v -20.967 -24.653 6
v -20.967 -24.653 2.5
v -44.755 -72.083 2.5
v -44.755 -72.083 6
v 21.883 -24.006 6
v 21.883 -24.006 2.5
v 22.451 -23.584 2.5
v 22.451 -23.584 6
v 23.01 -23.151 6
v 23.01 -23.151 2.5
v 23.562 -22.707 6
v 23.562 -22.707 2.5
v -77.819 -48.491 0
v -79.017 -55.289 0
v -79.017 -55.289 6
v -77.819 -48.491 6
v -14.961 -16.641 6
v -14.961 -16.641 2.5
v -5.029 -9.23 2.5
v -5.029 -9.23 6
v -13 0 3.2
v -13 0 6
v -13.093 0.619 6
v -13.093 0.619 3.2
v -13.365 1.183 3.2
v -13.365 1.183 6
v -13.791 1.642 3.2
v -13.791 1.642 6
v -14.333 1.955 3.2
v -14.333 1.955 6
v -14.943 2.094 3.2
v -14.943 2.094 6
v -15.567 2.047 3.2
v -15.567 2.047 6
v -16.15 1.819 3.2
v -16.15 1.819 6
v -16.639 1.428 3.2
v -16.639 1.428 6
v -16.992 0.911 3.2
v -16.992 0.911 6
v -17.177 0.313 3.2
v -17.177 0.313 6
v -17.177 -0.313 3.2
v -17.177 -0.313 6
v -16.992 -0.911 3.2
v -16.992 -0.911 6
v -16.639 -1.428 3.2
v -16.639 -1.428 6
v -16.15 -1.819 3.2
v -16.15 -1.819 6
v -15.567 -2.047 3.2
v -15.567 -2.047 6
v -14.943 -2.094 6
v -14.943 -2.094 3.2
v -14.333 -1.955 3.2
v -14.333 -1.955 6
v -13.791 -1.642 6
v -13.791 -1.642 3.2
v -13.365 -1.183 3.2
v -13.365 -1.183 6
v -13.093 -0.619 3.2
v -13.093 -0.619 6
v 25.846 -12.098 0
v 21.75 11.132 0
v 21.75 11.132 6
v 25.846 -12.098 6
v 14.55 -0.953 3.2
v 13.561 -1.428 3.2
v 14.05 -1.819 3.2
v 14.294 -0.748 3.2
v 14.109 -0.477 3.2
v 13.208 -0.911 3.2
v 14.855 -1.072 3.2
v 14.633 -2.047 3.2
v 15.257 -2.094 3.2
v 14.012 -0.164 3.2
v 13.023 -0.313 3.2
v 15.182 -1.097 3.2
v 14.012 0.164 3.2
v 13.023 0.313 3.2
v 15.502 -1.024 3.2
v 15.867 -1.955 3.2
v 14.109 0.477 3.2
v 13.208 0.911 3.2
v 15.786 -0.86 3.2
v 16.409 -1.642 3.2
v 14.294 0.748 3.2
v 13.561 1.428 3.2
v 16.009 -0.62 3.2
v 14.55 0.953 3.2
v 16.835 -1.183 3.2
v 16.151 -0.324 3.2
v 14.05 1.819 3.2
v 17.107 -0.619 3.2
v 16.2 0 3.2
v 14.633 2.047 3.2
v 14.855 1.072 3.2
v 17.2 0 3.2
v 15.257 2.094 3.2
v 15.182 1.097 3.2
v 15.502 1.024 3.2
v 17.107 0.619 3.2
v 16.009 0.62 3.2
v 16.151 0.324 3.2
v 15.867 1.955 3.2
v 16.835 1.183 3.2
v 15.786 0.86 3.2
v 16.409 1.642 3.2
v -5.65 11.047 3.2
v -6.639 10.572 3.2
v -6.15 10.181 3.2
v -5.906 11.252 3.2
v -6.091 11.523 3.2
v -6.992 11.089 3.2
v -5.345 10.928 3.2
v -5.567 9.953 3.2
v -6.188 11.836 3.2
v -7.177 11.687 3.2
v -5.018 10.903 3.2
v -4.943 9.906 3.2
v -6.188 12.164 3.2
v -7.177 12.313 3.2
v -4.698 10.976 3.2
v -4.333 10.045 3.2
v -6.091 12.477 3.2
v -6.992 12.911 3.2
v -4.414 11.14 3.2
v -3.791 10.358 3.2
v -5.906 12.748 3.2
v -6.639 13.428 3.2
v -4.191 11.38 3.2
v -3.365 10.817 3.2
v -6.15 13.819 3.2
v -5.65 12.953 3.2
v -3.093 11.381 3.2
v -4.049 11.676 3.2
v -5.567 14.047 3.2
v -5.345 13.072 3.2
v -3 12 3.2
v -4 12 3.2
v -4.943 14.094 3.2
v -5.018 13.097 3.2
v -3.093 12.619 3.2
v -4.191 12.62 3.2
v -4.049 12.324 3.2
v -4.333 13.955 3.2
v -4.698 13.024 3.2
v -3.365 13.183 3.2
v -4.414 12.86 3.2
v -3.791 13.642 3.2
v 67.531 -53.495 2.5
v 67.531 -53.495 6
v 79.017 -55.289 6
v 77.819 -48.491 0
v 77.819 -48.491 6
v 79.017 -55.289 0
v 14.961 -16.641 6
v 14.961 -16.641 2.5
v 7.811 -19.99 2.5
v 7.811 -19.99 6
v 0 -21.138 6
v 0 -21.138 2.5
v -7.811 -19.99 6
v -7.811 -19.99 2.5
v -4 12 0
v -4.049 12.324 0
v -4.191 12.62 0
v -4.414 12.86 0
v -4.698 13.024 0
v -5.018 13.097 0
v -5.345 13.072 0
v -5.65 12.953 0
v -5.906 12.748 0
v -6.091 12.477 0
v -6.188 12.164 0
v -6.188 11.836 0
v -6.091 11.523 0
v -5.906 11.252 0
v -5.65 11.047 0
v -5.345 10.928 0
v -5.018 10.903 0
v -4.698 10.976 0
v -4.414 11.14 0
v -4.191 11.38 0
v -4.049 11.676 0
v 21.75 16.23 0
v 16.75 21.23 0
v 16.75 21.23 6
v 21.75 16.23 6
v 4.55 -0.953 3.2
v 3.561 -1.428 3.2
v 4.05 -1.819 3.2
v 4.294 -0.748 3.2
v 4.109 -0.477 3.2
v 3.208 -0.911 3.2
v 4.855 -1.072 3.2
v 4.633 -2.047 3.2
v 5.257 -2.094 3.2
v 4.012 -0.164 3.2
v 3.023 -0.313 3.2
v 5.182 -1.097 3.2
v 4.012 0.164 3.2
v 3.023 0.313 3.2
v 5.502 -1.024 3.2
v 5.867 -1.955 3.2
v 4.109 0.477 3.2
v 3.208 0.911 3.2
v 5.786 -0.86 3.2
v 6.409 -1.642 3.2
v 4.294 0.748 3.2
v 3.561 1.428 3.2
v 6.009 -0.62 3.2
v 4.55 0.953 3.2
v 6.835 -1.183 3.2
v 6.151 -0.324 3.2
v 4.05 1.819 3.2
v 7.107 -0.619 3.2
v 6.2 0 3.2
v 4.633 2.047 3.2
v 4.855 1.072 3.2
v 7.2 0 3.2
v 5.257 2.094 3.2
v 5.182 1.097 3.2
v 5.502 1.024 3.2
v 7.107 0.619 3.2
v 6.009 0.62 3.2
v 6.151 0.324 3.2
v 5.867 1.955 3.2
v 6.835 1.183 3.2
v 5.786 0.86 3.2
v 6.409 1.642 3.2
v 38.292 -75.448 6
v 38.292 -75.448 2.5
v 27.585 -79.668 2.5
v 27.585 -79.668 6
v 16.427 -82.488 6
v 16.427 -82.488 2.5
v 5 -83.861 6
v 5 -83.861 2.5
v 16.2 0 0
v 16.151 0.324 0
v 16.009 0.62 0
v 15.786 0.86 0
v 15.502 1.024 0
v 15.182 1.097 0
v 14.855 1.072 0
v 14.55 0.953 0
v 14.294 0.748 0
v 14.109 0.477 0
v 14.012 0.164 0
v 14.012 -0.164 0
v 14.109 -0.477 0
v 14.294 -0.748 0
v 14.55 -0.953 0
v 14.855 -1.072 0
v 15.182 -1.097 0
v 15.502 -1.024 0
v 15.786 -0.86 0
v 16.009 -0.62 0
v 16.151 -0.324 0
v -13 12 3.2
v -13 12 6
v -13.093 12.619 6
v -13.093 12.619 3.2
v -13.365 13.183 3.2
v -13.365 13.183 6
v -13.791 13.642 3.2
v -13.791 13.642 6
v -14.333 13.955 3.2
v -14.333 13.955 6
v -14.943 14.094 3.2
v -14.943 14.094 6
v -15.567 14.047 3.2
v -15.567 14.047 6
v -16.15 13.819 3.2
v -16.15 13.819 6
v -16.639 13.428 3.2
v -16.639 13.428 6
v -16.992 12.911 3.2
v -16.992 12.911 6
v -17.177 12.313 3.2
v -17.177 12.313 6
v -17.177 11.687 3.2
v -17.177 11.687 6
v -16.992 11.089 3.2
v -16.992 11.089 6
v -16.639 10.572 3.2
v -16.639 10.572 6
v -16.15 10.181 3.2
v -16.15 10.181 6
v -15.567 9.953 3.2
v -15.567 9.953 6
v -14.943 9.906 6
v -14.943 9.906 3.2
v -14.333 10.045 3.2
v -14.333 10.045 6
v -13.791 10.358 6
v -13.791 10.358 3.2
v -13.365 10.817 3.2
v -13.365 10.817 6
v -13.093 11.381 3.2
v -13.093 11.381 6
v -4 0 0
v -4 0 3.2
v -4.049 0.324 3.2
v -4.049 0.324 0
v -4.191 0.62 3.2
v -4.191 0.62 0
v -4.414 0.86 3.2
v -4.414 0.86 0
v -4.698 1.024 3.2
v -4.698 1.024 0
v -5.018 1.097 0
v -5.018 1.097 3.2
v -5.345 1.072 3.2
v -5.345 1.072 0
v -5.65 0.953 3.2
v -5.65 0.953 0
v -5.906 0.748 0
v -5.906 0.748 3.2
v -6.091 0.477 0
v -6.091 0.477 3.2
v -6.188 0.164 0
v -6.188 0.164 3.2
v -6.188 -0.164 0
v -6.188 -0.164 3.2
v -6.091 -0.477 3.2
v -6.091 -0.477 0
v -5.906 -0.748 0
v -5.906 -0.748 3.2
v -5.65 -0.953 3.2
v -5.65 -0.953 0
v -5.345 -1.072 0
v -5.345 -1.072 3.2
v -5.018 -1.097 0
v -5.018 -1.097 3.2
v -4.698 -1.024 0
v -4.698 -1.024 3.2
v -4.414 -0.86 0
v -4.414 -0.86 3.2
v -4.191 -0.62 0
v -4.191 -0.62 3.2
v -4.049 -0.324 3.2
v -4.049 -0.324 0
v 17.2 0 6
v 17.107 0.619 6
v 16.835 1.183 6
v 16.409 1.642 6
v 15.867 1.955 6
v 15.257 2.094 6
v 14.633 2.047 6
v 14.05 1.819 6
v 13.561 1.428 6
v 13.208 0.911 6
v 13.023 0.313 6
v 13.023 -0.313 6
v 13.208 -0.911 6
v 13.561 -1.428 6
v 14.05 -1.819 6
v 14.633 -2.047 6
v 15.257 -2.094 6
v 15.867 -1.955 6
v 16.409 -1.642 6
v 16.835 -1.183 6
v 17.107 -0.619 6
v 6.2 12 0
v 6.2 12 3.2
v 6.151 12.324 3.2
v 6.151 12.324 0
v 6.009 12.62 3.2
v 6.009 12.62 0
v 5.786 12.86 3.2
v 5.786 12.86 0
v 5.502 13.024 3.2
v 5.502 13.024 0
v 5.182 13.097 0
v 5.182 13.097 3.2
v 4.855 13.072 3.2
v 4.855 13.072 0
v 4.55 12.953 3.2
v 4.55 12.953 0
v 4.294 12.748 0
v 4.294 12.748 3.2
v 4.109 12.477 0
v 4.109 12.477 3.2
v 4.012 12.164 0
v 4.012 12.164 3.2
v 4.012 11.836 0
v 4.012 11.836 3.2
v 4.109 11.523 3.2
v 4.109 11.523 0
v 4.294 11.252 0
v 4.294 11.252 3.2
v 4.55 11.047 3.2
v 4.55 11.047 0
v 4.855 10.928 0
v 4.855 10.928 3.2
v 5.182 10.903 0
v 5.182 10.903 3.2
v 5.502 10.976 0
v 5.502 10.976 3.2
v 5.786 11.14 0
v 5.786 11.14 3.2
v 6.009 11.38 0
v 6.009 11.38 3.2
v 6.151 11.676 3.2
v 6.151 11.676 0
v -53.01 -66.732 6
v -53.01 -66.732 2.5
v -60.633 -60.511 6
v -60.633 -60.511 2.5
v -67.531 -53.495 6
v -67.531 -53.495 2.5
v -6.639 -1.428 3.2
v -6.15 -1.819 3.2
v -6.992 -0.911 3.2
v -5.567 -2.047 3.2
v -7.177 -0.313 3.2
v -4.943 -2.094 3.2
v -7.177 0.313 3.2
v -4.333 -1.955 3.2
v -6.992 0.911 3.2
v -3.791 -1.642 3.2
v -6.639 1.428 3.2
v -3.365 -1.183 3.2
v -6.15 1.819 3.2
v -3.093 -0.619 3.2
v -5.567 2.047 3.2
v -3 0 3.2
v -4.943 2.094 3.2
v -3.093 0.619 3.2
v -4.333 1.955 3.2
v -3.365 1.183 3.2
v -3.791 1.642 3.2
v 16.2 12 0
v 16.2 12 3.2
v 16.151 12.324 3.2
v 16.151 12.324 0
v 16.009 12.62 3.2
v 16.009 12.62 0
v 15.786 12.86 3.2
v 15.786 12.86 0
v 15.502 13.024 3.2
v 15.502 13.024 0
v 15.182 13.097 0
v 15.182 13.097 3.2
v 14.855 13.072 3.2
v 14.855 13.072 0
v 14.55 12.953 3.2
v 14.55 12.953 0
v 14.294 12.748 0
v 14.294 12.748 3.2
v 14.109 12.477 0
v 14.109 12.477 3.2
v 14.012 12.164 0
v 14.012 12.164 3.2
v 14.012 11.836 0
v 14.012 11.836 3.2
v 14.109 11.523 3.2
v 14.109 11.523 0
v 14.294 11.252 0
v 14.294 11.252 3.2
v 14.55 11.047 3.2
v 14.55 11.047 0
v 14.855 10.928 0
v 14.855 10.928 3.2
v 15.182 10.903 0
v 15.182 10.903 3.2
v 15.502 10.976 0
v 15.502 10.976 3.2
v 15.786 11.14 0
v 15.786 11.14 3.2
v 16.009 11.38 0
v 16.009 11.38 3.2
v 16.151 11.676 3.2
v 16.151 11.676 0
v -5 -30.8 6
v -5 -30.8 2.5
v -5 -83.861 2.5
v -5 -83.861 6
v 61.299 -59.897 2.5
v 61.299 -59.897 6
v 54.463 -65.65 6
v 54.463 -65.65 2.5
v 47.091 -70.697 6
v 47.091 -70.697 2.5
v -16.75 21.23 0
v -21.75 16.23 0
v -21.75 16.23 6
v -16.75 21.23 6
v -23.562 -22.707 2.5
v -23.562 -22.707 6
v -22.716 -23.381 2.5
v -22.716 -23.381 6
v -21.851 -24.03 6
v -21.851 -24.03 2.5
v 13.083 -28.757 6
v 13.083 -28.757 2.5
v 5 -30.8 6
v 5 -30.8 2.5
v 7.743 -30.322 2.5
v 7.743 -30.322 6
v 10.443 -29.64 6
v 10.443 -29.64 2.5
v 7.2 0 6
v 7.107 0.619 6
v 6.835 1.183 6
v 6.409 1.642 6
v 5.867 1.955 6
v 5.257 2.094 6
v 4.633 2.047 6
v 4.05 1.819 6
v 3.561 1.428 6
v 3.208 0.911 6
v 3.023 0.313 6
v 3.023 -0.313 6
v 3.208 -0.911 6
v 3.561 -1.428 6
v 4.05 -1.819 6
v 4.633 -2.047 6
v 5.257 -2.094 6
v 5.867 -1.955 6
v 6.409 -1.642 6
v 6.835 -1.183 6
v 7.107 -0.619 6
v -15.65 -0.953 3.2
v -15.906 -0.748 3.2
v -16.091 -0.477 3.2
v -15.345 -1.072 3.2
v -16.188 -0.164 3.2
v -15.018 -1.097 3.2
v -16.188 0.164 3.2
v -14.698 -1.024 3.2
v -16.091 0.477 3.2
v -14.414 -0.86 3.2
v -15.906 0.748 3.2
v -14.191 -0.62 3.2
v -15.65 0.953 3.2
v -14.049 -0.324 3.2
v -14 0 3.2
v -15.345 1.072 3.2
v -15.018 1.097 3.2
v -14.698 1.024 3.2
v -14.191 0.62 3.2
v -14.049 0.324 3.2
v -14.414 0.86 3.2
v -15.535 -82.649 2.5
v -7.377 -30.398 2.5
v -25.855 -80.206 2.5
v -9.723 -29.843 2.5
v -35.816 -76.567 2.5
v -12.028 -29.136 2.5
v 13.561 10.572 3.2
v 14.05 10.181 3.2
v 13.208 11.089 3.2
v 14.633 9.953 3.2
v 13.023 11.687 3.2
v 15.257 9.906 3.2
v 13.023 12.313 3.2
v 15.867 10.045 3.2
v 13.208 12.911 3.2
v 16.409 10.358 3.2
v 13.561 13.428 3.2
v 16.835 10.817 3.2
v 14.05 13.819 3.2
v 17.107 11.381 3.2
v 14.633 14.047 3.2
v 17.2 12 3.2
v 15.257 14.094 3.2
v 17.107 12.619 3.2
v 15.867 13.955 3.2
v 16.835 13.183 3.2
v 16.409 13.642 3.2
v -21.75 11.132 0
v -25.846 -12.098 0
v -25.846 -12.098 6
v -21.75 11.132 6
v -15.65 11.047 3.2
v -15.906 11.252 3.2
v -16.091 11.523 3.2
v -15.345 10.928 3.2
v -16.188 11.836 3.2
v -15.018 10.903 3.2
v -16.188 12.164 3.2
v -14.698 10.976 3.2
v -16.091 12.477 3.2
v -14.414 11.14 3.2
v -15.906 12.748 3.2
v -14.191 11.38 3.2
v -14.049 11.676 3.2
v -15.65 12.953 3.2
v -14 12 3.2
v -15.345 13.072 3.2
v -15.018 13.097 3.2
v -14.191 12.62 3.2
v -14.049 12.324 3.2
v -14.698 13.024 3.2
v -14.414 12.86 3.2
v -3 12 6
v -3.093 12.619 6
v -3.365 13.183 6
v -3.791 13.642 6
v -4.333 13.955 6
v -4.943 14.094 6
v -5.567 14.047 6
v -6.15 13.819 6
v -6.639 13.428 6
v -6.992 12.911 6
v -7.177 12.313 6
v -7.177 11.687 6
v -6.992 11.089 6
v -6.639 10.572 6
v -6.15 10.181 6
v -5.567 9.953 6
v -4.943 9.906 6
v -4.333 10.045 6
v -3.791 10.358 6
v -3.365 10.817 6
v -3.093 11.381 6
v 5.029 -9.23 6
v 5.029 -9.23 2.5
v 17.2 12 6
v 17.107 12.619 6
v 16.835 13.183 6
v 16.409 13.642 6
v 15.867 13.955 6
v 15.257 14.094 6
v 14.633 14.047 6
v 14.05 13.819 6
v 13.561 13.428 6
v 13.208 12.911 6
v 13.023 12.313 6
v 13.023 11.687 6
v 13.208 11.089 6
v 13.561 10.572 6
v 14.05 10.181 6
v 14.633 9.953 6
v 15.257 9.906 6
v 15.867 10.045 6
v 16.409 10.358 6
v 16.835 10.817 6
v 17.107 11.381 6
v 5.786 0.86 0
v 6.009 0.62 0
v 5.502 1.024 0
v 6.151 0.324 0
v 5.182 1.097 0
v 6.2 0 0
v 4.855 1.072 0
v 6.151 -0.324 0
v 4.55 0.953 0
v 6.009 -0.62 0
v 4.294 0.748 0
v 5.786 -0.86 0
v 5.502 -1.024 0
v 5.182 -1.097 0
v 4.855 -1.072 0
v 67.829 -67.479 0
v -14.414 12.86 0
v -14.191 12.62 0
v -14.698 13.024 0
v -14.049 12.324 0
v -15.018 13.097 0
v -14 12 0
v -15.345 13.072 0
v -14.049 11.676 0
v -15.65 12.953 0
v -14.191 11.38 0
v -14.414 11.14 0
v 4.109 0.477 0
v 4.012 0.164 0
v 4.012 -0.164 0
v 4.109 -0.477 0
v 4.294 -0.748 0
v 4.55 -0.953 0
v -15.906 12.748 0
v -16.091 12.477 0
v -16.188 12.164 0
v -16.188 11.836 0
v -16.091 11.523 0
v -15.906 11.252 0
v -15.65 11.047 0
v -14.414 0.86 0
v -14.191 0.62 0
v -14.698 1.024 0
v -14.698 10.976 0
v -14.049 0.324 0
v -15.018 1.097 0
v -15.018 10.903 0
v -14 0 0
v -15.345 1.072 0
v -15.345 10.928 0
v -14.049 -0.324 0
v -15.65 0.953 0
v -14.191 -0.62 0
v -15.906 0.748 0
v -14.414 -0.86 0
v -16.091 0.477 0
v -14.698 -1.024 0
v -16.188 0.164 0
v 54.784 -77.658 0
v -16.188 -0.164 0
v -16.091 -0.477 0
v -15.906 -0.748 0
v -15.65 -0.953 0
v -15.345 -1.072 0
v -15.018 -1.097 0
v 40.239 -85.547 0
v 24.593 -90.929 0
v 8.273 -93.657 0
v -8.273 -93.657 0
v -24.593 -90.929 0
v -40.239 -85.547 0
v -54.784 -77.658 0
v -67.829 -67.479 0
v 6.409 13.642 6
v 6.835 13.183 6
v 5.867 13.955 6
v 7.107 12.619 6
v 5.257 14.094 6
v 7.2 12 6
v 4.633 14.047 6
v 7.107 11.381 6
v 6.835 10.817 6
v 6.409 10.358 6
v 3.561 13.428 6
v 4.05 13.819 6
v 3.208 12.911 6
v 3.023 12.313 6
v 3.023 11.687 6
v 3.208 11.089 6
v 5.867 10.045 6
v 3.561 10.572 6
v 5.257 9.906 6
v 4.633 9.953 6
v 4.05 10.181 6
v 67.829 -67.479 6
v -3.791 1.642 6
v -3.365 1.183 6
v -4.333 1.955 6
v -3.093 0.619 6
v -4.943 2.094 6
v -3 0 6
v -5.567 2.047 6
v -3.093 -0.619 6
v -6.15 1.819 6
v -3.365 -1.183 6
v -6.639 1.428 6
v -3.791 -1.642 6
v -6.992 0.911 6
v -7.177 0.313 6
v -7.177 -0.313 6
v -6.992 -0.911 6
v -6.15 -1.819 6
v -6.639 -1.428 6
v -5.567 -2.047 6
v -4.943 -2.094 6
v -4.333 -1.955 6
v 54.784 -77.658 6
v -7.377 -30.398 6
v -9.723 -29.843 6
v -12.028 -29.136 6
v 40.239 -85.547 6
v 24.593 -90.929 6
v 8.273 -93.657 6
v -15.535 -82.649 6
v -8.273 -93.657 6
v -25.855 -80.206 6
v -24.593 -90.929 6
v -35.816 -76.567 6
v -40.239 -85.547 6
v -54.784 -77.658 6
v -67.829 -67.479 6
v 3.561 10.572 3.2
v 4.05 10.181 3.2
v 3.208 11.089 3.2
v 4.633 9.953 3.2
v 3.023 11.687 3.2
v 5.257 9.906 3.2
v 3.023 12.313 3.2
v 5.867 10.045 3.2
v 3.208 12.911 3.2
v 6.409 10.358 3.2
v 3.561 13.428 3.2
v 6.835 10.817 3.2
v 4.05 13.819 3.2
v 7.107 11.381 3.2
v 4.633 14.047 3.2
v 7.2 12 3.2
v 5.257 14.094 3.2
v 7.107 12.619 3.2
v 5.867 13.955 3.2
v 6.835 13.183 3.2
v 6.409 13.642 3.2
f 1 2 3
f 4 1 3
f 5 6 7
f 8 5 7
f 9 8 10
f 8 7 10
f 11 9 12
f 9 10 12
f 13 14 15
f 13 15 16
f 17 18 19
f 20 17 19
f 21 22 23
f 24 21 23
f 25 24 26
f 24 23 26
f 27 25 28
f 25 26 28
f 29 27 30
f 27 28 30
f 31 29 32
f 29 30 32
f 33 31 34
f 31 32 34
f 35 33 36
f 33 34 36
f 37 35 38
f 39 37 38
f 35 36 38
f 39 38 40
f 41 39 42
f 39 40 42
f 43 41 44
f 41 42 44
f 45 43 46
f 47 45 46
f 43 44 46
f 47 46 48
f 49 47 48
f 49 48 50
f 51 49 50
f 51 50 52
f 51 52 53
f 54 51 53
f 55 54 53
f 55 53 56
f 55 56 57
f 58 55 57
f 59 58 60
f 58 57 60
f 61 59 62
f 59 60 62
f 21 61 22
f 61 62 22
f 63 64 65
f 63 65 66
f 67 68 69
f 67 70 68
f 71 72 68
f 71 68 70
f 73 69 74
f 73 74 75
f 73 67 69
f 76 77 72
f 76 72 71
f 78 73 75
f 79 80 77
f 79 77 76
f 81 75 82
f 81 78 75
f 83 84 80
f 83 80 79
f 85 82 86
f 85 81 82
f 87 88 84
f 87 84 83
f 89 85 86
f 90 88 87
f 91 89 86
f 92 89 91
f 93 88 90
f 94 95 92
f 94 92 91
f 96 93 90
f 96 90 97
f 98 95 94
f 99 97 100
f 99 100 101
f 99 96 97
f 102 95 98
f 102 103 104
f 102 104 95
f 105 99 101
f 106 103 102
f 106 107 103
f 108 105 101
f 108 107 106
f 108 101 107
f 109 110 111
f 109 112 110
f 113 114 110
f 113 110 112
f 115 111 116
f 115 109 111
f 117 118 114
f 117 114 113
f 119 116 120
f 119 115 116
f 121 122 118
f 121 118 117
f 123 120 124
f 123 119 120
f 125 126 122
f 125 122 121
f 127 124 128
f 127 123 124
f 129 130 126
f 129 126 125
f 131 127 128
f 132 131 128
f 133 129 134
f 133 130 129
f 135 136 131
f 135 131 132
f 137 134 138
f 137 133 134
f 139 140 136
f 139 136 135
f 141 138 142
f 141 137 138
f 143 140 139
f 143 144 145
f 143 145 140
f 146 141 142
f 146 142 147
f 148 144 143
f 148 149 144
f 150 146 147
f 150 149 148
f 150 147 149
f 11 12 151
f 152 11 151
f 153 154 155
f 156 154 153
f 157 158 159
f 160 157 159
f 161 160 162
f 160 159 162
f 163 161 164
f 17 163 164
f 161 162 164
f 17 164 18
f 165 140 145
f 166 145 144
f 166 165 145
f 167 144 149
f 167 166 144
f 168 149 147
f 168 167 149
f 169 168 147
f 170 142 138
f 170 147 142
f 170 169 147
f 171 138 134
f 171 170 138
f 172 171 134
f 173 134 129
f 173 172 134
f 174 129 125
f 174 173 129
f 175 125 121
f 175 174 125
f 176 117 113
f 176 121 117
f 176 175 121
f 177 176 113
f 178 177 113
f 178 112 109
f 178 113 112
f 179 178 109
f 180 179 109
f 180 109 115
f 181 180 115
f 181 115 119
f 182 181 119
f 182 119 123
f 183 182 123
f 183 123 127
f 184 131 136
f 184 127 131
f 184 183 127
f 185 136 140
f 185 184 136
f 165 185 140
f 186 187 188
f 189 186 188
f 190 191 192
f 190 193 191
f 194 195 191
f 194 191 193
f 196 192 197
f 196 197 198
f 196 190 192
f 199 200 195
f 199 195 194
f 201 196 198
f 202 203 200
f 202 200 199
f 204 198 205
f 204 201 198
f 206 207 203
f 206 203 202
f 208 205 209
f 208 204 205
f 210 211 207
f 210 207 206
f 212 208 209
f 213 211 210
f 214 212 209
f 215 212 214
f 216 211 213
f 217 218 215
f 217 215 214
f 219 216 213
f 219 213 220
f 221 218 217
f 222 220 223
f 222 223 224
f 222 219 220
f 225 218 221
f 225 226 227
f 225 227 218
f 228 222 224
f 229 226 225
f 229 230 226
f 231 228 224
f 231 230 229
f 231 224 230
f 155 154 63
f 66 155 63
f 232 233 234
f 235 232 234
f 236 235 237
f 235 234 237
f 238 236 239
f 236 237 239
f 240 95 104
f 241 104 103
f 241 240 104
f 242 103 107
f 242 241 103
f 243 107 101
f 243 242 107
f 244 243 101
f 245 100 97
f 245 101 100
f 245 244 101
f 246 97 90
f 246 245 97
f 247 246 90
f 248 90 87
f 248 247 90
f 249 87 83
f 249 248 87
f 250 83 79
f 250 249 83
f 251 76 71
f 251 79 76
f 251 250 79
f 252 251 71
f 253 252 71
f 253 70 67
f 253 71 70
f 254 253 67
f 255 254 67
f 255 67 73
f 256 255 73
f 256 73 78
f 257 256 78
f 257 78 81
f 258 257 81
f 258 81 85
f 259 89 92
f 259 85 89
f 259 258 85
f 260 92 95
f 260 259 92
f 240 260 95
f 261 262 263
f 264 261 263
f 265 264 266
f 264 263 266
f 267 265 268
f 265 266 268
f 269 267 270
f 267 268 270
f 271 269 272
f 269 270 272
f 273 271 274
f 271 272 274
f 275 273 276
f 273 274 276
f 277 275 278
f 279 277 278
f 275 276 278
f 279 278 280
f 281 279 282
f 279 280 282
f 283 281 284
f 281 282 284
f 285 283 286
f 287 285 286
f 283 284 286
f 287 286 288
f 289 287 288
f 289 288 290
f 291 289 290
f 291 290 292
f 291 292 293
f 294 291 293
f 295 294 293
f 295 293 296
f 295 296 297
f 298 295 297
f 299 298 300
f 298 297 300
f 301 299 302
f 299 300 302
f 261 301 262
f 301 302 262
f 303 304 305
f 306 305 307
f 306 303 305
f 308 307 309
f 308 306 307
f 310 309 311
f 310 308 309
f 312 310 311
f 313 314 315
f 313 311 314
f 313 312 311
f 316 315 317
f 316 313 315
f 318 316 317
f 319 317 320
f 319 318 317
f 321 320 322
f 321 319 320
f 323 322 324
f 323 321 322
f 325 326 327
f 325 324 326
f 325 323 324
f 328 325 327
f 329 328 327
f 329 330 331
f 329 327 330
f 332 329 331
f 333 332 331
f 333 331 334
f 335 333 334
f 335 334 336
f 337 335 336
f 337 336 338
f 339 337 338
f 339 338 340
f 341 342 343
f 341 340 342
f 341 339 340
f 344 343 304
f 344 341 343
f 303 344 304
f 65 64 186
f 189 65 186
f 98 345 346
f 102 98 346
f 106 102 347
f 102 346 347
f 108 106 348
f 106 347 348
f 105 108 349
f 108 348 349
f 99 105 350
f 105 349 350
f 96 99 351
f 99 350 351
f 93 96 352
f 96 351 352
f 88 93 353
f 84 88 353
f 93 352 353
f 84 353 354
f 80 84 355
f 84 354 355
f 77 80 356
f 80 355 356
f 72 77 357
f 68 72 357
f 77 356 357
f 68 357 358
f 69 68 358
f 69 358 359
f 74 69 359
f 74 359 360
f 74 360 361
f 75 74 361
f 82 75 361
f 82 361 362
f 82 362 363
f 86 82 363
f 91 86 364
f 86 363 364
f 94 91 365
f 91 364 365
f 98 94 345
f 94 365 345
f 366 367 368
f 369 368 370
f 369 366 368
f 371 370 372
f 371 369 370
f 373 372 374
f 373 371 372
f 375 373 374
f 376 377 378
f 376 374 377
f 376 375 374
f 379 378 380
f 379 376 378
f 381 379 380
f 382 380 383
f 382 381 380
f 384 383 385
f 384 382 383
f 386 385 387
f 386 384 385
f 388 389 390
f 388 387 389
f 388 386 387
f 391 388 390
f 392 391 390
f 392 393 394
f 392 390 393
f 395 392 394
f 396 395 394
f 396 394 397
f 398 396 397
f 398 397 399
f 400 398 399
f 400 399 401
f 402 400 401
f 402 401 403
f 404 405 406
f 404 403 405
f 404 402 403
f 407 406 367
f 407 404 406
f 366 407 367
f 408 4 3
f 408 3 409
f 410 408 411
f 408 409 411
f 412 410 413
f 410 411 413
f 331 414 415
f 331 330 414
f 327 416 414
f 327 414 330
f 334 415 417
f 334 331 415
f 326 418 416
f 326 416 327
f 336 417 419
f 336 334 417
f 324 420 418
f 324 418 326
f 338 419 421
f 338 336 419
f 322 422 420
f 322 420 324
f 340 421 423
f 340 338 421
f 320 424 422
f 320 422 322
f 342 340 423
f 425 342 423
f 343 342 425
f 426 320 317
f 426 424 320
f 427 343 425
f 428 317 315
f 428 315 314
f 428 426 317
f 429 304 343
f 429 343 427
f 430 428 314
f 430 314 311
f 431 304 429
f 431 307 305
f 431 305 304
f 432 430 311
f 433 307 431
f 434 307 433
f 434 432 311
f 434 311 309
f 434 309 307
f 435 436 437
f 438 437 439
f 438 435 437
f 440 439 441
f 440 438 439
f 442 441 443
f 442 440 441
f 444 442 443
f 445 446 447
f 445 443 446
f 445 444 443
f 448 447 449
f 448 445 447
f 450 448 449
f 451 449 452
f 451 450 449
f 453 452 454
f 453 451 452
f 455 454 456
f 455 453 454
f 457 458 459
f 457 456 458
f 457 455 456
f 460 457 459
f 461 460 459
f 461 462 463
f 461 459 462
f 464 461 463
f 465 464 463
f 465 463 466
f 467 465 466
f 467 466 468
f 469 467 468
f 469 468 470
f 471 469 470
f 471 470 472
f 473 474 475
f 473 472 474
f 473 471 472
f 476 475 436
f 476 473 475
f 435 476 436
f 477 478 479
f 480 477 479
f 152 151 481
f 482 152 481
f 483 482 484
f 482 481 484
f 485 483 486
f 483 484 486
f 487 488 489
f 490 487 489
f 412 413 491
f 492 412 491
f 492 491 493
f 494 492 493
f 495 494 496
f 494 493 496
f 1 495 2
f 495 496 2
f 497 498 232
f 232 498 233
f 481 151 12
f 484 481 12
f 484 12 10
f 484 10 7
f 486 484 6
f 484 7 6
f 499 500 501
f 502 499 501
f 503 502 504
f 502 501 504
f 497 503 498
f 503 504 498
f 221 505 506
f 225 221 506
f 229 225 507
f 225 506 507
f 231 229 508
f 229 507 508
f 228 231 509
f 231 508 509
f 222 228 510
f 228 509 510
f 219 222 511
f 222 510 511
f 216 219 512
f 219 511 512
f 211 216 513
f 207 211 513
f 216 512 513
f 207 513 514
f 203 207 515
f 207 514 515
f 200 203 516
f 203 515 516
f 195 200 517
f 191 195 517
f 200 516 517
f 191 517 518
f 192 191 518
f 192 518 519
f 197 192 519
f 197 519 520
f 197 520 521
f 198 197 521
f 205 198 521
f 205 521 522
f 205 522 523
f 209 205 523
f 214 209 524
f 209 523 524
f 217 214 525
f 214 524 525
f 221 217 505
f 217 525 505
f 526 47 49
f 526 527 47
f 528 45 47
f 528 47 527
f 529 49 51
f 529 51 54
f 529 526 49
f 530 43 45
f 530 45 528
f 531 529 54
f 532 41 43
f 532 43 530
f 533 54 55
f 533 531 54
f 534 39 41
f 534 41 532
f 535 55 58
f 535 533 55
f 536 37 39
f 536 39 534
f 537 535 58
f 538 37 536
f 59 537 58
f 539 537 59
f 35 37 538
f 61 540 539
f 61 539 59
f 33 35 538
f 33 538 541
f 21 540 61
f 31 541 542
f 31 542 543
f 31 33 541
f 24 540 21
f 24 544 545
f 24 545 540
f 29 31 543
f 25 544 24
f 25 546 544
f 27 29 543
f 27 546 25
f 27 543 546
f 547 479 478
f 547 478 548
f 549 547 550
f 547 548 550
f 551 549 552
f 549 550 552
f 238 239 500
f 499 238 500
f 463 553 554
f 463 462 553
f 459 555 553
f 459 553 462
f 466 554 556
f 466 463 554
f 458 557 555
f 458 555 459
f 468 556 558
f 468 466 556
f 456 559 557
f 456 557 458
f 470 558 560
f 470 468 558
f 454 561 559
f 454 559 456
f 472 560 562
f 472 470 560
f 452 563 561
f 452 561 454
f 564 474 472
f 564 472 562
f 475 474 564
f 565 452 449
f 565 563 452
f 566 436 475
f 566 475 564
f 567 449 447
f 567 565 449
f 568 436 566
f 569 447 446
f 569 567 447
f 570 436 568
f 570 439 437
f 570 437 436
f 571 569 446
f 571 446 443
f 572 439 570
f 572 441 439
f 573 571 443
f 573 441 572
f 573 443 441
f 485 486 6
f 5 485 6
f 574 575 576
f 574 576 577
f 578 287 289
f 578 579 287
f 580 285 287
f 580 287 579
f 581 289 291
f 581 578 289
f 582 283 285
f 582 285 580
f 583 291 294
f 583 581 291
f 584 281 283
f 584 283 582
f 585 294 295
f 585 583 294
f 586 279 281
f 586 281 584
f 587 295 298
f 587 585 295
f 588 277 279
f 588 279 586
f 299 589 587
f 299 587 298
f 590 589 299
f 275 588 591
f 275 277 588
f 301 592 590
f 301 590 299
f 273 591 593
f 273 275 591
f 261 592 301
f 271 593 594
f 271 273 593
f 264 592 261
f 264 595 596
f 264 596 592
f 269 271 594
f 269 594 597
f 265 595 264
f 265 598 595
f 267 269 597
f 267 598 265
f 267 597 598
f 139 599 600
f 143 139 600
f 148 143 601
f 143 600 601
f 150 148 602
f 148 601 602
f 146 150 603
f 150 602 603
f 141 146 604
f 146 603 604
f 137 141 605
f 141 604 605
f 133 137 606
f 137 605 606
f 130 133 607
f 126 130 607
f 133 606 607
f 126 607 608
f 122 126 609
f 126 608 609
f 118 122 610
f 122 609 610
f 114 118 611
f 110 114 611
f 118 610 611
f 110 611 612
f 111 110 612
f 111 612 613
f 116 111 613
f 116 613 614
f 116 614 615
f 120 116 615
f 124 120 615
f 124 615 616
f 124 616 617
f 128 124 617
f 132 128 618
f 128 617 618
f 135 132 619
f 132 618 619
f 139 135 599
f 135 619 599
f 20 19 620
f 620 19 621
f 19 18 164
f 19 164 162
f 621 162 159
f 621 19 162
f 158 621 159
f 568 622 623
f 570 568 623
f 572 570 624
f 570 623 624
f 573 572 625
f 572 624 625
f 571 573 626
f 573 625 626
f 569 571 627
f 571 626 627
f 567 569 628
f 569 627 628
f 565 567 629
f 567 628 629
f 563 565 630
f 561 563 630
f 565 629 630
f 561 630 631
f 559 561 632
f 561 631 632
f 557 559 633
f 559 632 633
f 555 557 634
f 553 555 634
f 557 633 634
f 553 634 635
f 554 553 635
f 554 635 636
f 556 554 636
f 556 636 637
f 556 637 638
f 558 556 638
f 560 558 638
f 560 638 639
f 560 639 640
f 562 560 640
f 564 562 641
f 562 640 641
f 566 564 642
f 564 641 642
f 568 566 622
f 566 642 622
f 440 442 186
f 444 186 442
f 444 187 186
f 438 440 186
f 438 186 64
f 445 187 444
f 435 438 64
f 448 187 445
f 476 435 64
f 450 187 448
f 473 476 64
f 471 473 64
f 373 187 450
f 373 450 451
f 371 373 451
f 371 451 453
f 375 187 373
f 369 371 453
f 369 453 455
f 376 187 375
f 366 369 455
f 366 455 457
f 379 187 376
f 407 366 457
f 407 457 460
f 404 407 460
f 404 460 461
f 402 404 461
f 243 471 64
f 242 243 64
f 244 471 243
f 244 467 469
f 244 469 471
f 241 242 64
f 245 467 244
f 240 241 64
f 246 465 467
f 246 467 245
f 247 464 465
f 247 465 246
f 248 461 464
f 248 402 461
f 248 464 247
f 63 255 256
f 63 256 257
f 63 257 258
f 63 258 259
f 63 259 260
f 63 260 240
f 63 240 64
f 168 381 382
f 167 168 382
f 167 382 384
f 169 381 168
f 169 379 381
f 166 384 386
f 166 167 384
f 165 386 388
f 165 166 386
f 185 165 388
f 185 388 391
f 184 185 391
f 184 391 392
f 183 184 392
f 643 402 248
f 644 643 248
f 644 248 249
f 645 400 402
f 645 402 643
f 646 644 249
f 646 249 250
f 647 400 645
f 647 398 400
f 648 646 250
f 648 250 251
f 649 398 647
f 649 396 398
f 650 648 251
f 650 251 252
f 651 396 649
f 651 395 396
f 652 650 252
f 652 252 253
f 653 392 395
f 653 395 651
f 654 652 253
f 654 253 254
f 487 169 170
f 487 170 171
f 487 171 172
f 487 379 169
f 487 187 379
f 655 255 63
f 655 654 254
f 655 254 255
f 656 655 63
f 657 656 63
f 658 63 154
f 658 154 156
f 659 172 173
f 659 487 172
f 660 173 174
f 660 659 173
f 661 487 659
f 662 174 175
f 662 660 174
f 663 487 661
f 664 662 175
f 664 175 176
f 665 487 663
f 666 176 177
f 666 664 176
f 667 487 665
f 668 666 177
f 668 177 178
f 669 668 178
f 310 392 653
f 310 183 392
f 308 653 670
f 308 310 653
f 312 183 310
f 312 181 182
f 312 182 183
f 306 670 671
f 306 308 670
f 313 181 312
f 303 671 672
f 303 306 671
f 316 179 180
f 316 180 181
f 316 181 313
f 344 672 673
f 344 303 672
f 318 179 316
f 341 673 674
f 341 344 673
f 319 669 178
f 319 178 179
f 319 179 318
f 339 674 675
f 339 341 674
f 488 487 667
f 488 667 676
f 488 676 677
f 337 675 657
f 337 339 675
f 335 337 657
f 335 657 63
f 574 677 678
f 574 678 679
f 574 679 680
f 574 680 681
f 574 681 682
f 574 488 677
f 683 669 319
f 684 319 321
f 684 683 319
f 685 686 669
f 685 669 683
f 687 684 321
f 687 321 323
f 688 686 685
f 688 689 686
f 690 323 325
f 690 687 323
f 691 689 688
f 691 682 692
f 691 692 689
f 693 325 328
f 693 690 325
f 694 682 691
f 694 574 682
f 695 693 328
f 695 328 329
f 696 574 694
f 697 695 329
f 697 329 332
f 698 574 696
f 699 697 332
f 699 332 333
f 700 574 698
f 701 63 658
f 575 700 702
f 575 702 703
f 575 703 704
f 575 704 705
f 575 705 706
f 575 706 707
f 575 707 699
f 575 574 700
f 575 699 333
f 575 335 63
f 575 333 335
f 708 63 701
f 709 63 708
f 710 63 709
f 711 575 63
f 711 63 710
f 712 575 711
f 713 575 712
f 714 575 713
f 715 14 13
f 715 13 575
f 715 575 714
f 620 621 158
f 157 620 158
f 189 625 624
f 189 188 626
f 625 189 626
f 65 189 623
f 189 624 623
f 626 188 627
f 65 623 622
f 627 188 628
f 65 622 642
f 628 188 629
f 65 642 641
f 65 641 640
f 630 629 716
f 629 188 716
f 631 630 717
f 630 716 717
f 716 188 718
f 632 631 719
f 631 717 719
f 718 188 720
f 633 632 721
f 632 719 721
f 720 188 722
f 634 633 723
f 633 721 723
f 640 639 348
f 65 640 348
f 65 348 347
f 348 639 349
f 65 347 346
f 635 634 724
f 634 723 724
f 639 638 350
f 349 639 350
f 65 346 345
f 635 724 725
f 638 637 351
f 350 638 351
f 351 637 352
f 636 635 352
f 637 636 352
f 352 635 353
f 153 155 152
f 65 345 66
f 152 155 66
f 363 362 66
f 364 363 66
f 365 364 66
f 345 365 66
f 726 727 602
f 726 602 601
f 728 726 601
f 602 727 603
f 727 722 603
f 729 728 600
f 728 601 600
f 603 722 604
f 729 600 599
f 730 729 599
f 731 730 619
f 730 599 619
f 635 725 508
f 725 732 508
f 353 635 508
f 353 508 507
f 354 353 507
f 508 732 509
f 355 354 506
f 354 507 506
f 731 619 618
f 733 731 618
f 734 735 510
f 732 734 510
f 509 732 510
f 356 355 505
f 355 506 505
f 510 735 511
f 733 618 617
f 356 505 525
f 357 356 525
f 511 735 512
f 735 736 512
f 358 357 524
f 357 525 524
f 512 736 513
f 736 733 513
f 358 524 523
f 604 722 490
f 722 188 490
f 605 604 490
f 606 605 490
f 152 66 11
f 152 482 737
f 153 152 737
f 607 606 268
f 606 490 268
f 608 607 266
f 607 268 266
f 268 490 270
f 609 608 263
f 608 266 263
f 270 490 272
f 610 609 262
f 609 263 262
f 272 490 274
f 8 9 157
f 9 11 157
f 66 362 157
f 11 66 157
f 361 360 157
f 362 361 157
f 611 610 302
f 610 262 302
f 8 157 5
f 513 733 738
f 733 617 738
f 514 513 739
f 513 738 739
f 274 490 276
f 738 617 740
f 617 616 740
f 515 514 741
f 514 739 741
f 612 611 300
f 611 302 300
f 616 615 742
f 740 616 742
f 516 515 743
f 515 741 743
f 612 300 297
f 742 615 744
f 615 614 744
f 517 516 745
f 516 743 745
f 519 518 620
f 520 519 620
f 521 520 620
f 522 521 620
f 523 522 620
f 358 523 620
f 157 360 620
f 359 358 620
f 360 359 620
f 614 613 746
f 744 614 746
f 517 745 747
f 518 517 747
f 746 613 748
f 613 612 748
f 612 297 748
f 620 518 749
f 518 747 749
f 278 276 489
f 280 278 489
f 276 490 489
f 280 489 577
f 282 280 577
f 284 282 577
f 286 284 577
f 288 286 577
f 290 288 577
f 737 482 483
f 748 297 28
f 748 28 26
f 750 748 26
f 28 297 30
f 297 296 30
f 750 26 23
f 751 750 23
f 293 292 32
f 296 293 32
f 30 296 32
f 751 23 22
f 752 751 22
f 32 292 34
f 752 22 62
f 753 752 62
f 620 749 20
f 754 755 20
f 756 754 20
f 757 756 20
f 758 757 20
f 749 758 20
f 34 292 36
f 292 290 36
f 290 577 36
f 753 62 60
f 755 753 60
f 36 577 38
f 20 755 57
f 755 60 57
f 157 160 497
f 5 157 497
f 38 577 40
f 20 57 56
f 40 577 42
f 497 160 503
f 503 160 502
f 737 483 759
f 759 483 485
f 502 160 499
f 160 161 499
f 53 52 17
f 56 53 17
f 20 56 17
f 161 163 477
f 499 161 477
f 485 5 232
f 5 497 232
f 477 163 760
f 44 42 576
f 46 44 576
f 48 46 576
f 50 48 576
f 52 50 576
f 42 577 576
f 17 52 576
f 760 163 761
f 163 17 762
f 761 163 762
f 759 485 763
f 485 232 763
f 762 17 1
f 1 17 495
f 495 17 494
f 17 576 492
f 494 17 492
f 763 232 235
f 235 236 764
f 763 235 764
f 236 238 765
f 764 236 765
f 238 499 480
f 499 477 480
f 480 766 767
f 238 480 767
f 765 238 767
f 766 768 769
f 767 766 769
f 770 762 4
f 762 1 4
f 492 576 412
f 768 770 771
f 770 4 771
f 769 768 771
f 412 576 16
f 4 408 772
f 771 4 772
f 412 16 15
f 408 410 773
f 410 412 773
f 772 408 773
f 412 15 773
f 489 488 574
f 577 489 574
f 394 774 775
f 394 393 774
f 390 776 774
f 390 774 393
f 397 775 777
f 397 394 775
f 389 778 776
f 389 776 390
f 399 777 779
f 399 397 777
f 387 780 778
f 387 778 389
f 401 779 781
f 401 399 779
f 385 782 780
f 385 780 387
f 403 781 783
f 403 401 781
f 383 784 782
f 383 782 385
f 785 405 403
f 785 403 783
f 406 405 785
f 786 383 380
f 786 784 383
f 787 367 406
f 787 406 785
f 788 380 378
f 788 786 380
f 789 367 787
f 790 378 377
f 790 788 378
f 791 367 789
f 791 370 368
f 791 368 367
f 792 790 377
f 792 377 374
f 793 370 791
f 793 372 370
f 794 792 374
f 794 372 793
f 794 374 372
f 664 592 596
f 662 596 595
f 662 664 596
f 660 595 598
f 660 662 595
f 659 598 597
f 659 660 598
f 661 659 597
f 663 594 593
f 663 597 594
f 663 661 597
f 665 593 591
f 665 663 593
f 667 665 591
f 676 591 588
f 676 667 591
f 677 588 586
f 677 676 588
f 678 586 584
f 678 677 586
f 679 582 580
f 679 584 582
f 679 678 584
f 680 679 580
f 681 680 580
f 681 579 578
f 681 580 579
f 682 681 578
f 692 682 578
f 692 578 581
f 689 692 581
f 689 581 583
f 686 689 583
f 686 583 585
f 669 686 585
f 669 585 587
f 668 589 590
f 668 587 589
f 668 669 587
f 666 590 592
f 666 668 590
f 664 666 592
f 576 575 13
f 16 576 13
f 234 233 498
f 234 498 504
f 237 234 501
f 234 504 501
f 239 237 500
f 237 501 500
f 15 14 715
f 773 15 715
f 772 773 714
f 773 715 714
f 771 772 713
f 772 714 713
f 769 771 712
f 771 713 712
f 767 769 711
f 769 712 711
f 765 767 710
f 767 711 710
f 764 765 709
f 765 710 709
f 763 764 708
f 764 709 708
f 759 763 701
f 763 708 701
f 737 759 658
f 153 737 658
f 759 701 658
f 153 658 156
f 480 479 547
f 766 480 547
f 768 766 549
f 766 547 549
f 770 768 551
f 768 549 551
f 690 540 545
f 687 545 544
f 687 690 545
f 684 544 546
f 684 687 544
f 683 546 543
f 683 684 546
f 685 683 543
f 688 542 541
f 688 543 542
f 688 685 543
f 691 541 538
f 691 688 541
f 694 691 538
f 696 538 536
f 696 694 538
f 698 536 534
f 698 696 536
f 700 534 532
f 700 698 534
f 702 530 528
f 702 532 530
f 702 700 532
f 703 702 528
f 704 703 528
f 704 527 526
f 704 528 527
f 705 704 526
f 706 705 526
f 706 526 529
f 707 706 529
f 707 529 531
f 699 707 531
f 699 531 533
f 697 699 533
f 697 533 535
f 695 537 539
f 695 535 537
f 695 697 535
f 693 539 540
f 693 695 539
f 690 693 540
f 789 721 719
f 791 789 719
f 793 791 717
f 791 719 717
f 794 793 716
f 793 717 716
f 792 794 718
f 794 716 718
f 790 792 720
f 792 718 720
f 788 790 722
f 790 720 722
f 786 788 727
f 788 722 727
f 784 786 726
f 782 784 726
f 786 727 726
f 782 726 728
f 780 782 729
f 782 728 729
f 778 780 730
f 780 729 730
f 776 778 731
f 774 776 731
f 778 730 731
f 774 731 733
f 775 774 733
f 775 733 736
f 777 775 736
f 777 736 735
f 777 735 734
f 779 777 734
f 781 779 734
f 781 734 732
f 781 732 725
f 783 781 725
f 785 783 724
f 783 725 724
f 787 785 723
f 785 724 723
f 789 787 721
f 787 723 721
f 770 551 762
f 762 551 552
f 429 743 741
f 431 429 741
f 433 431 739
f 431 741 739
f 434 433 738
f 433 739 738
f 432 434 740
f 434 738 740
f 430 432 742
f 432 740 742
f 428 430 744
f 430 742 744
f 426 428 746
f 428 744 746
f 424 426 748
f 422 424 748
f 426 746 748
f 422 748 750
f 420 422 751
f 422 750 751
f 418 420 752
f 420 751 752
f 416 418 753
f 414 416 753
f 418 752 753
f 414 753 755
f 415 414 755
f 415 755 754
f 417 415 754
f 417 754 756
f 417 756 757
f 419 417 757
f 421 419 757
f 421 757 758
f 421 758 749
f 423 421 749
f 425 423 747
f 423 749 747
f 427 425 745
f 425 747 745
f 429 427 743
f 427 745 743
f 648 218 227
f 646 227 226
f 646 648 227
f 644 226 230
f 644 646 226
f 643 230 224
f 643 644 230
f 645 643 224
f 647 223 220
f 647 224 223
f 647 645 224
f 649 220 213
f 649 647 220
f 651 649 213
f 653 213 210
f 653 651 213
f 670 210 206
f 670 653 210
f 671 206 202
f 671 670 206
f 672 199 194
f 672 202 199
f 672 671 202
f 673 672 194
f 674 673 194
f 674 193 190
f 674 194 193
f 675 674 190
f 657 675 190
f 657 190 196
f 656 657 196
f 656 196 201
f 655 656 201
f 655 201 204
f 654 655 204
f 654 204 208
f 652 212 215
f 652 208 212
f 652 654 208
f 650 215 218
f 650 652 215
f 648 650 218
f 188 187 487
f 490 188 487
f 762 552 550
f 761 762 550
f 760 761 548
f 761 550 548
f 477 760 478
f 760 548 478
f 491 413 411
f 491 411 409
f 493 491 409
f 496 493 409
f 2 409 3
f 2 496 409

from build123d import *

# Parameters (mm, degrees)
SKETCH_1_R          = 1.1
EXTRUDE_1_DEPTH     = 6
EXTRUDE_2_DEPTH     = 2.5
SKETCH_2_R          = 2.1
CUT_EXTRUDE_1_DEPTH = 2.8
CHAMFER_1_SIZE      = 5
CHAMFER_2_SIZE      = 5
CHAMFER_2_SIZE_2    = 20.362059886


with BuildPart() as part:
    # 스케치1 → 보스-돌출1 (new body)
    # profile 1 of 3: a face of its own
    with BuildSketch(Plane.XY):
        with BuildLine():
            Line((81.914344353, -51.358871931), (21.75, -9.23))
            Line((21.75, -9.23), (5.029063305, -9.23))
            Line((5.029063305, -9.23), (14.961256377, -16.641470968))
            ThreePointArc((14.961256377, -16.641470968), (0, -21.138080256), (-14.961256377, -16.641470968))
            Line((-14.961256377, -16.641470968), (-5.029063305, -9.23))
            Line((-5.029063305, -9.23), (-21.75, -9.23))
            Line((-21.75, -9.23), (-81.914344353, -51.358871931))
            ThreePointArc((-81.914344353, -51.358871931), (0, -94), (81.914344353, -51.358871931))
        make_face()
        with BuildLine():
            ThreePointArc((-23.561943602, -22.706651125), (-22.285743682, -23.708292339), (-20.967016307, -24.653241791))
            Line((-20.967016307, -24.653241791), (-44.754559097, -72.083477382))
            ThreePointArc((-44.754559097, -72.083477382), (-56.906680731, -63.725387688), (-67.530529729, -53.494769135))
            Line((-67.530529729, -53.494769135), (-23.561943602, -22.706651125))
        make_face(mode=Mode.SUBTRACT)
        with BuildLine():
            ThreePointArc((-12.028210812, -29.136293911), (-8.554644148, -30.139383899), (-5, -30.799959309))
            Line((-5, -30.799959309), (-5, -83.861003778))
            ThreePointArc((-5, -83.861003778), (-20.731227032, -81.579770642), (-35.815753602, -76.566529502))
            Line((-35.815753602, -76.566529502), (-12.028210812, -29.136293911))
        make_face(mode=Mode.SUBTRACT)
        with BuildLine():
            Line((5, -83.861003778), (5, -30.799959309))
            ThreePointArc((5, -30.799959309), (9.099152416, -30.006144343), (13.08329394, -28.757221189))
            Line((13.08329394, -28.757221189), (38.291645519, -75.447835351))
            ThreePointArc((38.291645519, -75.447835351), (22.050782156, -81.256879421), (5, -83.861003778))
        make_face(mode=Mode.SUBTRACT)
        with BuildLine():
            ThreePointArc((21.88270877, -24.006400351), (22.731617723, -23.36853011), (23.561943602, -22.706651125))
            Line((23.561943602, -22.706651125), (67.530529729, -53.494769135))
            ThreePointArc((67.530529729, -53.494769135), (57.952623233, -62.858503182), (47.09106035, -70.697014513))
            Line((47.09106035, -70.697014513), (21.88270877, -24.006400351))
        make_face(mode=Mode.SUBTRACT)
    # profile 2 of 3: a face of its own
    with BuildSketch(Plane.XY):
        Polygon((5.029063305, -9.23), (21.75, -9.23), (0, 6), (-21.75, -9.23), (-5.029063305, -9.23), align=None)
        with Locations((-5.1, 0)):
            Circle(SKETCH_1_R, mode=Mode.SUBTRACT)
        with Locations((5.1, 0)):
            Circle(SKETCH_1_R, mode=Mode.SUBTRACT)
    # profile 3 of 3: a face of its own
    with BuildSketch(Plane.XY):
        Polygon((21.75, -9.23), (21.75, 21.23), (-21.75, 21.23), (-21.75, -9.23), (0, 6), align=None)
        with Locations((-15.1, 0)):
            Circle(SKETCH_1_R, mode=Mode.SUBTRACT)
        with Locations((-15.1, 12)):
            Circle(SKETCH_1_R, mode=Mode.SUBTRACT)
        with Locations((-5.1, 12)):
            Circle(SKETCH_1_R, mode=Mode.SUBTRACT)
        with Locations((15.1, 0)):
            Circle(SKETCH_1_R, mode=Mode.SUBTRACT)
        with Locations((5.1, 12)):
            Circle(SKETCH_1_R, mode=Mode.SUBTRACT)
        with Locations((15.1, 12)):
            Circle(SKETCH_1_R, mode=Mode.SUBTRACT)
    extrude(amount=EXTRUDE_1_DEPTH)

    # 스케치1<3> → 보스-돌출2 (add)
    with BuildSketch(Plane.XY):
        with BuildLine():
            Line((-23.561943602, -22.706651125), (-67.530529729, -53.494769135))
            ThreePointArc((-67.530529729, -53.494769135), (-56.906680731, -63.725387688), (-44.754559097, -72.083477382))
            Line((-44.754559097, -72.083477382), (-20.967016307, -24.653241791))
            ThreePointArc((-20.967016307, -24.653241791), (-22.285743682, -23.708292339), (-23.561943602, -22.706651125))
        make_face()
        with BuildLine():
            ThreePointArc((-12.028210812, -29.136293911), (-8.554644148, -30.139383899), (-5, -30.799959309))
            Line((-5, -30.799959309), (-5, -83.861003778))
            ThreePointArc((-5, -83.861003778), (-20.731227032, -81.579770642), (-35.815753602, -76.566529502))
            Line((-35.815753602, -76.566529502), (-12.028210812, -29.136293911))
        make_face()
        with BuildLine():
            ThreePointArc((5, -30.799959309), (9.099152416, -30.006144343), (13.08329394, -28.757221189))
            Line((13.08329394, -28.757221189), (38.291645519, -75.447835351))
            ThreePointArc((38.291645519, -75.447835351), (22.050782156, -81.256879421), (5, -83.861003778))
            Line((5, -83.861003778), (5, -30.799959309))
        make_face()
        with BuildLine():
            ThreePointArc((21.88270877, -24.006400351), (22.731617723, -23.36853011), (23.561943602, -22.706651125))
            Line((23.561943602, -22.706651125), (67.530529729, -53.494769135))
            ThreePointArc((67.530529729, -53.494769135), (57.952623233, -62.858503182), (47.09106035, -70.697014513))
            Line((47.09106035, -70.697014513), (21.88270877, -24.006400351))
        make_face()
        with BuildLine():
            Line((14.961256377, -16.641470968), (5.029063305, -9.23))
            Line((5.029063305, -9.23), (-5.029063305, -9.23))
            Line((-5.029063305, -9.23), (-14.961256377, -16.641470968))
            ThreePointArc((-14.961256377, -16.641470968), (0, -21.138080256), (14.961256377, -16.641470968))
        make_face()
    extrude(amount=EXTRUDE_2_DEPTH)

    # 스케치2 → 컷-돌출1 (cut)
    with BuildSketch(Plane.XY.offset(6)):
        with Locations((-15.1, 12)):
            Circle(SKETCH_2_R)
        with Locations((-5.1, 12)):
            Circle(SKETCH_2_R)
        with Locations((5.1, 12)):
            Circle(SKETCH_2_R)
        with Locations((15.1, 12)):
            Circle(SKETCH_2_R)
        with Locations((15.1, 0)):
            Circle(SKETCH_2_R)
        with Locations((5.1, 0)):
            Circle(SKETCH_2_R)
        with Locations((-5.1, 0)):
            Circle(SKETCH_2_R)
        with Locations((-15.1, 0)):
            Circle(SKETCH_2_R)
    extrude(amount=-CUT_EXTRUDE_1_DEPTH, mode=Mode.SUBTRACT)

    # 모따기1
    chamfer_1_edges = [part.edges().sort_by_distance(p)[0] for p in [
        (-21.75, 21.23, 3),
        (21.75, 21.23, 3),
    ]]
    chamfer(chamfer_1_edges, length=CHAMFER_1_SIZE)

    # 모따기2
    # the kernel refuses this chamfer: 20.362059886, 5 mm, written as the material it adds along each edge
    with BuildSketch(Plane(origin=(-21.75, -9.23, 0), x_dir=(-0.8191434435315306, -0.573588719309669, 0), z_dir=(0, 0, 1))) as chamfer_2_piece_1:
        Polygon((CHAMFER_2_SIZE, 0), (-CHAMFER_2_SIZE_2 * 0.573588719322, -CHAMFER_2_SIZE_2 * 0.819143443549), (0, 0), align=None)
    extrude(amount=6)
    with BuildSketch(Plane(origin=(21.75, -9.23, 0), x_dir=(0, 1, 0), z_dir=(0, 0, 1))) as chamfer_2_piece_2:
        Polygon((CHAMFER_2_SIZE_2, 0), (-CHAMFER_2_SIZE * 0.57358871931, -CHAMFER_2_SIZE * 0.819143443532), (0, 0), align=None)
    extrude(amount=6)
    # the kernel refuses this chamfer: 20.362059886, 5 mm, written as the material it takes off along each edge
    with BuildSketch(Plane(origin=(81.914344353, -51.358871931, -12.85841494), x_dir=(-0.8191434435315298, 0.5735887193096699, 0), z_dir=(0, 0, 1))) as chamfer_2_2_piece_1:
        with BuildLine():
            Line((CHAMFER_2_SIZE, 0), (0.119182901, 4.880817099))
            ThreePointArc((0.119182901, 4.880817099), (0.031506692, 2.510048959), (0, 0))
            Line((0, 0), (CHAMFER_2_SIZE, 0))
        make_face()
    extrude(amount=31.71682988, mode=Mode.SUBTRACT)
    with BuildSketch(Plane(origin=(-81.914344353, -51.358871931, -12.85841494), x_dir=(0.5934141945147567, -0.8048972566411209, 0), z_dir=(0, 0, 1))) as chamfer_2_2_piece_2:
        with BuildLine():
            Line((4.882272025, 0), (CHAMFER_2_SIZE * 0.0244113601227, CHAMFER_2_SIZE * 0.999701998346))
            Line((CHAMFER_2_SIZE * 0.0244113601227, CHAMFER_2_SIZE * 0.999701998346), (0, 0))
            ThreePointArc((0, 0), (2.510070082, -0.029776406), (4.882272025, 0))
        make_face()
    extrude(amount=31.71682988, mode=Mode.SUBTRACT)


solid = part.part
